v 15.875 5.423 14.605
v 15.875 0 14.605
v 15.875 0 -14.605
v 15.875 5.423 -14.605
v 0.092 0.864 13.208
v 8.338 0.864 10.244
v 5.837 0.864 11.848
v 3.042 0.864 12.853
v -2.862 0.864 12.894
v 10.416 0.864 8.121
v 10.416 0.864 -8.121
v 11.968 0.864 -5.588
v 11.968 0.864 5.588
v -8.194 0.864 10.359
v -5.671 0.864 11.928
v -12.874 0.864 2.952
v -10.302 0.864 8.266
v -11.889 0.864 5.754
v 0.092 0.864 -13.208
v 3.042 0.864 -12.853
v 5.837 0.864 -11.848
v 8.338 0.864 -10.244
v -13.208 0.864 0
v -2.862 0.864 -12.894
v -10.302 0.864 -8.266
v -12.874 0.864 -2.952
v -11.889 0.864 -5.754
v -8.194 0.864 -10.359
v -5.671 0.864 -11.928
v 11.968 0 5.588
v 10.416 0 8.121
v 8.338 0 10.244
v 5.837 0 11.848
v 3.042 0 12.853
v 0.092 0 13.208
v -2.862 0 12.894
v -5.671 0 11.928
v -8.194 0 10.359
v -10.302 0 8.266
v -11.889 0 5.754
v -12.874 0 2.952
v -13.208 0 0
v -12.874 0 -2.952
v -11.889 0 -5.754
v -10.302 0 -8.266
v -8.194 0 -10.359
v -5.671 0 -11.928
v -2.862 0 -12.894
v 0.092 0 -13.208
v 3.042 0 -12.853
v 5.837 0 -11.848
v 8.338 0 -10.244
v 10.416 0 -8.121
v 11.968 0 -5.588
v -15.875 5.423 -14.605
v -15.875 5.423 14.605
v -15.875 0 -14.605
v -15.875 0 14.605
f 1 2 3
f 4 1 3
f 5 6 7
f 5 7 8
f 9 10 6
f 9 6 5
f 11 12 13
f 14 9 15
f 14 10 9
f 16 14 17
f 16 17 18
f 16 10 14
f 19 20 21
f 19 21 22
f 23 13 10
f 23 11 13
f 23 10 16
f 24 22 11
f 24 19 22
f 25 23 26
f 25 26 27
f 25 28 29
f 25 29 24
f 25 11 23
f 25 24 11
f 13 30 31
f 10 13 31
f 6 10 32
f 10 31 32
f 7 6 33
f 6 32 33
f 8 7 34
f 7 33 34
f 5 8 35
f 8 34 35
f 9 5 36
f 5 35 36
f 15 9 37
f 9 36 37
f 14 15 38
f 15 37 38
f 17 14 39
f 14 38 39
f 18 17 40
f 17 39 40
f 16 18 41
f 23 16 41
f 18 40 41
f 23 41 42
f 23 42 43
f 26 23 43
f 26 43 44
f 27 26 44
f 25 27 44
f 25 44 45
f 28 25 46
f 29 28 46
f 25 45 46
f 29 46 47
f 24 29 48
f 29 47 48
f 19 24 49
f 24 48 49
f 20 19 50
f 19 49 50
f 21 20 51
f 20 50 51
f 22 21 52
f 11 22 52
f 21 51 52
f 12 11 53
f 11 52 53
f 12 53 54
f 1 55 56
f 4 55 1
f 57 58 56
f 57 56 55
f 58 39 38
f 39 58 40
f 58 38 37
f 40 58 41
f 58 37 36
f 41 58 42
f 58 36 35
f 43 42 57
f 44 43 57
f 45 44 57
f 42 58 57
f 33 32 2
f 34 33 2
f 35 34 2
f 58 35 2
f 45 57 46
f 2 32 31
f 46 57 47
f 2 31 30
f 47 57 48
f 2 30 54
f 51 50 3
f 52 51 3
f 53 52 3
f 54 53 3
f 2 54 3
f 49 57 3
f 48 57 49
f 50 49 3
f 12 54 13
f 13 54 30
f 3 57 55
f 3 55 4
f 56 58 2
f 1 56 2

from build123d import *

# Parameters (mm, degrees)
SKETCH3_W           = 31.75
SKETCH3_H           = 29.21
BOSS_EXTRUDE2_DEPTH = 5.4229
CUT_EXTRUDE1_DEPTH  = 0.8636


with BuildPart() as part:
    # Sketch3 → Boss-Extrude2 (new body)
    with BuildSketch(Plane(origin=(0, 0, 0), x_dir=(1, 0, 0), z_dir=(0, 1, 0))):
        Rectangle(SKETCH3_W, SKETCH3_H)
    extrude(amount=BOSS_EXTRUDE2_DEPTH)

    # Sketch1 → Cut-Extrude1 (cut)
    with BuildSketch(Plane(origin=(0, 0, 0), x_dir=(1, 0, 0), z_dir=(0, 1, 0))):
        with BuildLine():
            Line((11.967686493, 5.588), (11.967686493, -5.588))
            ThreePointArc((11.967686493, -5.588), (-13.208, 0), (11.967686493, 5.588))
        make_face()
    extrude(amount=CUT_EXTRUDE1_DEPTH, mode=Mode.SUBTRACT)


solid = part.part
